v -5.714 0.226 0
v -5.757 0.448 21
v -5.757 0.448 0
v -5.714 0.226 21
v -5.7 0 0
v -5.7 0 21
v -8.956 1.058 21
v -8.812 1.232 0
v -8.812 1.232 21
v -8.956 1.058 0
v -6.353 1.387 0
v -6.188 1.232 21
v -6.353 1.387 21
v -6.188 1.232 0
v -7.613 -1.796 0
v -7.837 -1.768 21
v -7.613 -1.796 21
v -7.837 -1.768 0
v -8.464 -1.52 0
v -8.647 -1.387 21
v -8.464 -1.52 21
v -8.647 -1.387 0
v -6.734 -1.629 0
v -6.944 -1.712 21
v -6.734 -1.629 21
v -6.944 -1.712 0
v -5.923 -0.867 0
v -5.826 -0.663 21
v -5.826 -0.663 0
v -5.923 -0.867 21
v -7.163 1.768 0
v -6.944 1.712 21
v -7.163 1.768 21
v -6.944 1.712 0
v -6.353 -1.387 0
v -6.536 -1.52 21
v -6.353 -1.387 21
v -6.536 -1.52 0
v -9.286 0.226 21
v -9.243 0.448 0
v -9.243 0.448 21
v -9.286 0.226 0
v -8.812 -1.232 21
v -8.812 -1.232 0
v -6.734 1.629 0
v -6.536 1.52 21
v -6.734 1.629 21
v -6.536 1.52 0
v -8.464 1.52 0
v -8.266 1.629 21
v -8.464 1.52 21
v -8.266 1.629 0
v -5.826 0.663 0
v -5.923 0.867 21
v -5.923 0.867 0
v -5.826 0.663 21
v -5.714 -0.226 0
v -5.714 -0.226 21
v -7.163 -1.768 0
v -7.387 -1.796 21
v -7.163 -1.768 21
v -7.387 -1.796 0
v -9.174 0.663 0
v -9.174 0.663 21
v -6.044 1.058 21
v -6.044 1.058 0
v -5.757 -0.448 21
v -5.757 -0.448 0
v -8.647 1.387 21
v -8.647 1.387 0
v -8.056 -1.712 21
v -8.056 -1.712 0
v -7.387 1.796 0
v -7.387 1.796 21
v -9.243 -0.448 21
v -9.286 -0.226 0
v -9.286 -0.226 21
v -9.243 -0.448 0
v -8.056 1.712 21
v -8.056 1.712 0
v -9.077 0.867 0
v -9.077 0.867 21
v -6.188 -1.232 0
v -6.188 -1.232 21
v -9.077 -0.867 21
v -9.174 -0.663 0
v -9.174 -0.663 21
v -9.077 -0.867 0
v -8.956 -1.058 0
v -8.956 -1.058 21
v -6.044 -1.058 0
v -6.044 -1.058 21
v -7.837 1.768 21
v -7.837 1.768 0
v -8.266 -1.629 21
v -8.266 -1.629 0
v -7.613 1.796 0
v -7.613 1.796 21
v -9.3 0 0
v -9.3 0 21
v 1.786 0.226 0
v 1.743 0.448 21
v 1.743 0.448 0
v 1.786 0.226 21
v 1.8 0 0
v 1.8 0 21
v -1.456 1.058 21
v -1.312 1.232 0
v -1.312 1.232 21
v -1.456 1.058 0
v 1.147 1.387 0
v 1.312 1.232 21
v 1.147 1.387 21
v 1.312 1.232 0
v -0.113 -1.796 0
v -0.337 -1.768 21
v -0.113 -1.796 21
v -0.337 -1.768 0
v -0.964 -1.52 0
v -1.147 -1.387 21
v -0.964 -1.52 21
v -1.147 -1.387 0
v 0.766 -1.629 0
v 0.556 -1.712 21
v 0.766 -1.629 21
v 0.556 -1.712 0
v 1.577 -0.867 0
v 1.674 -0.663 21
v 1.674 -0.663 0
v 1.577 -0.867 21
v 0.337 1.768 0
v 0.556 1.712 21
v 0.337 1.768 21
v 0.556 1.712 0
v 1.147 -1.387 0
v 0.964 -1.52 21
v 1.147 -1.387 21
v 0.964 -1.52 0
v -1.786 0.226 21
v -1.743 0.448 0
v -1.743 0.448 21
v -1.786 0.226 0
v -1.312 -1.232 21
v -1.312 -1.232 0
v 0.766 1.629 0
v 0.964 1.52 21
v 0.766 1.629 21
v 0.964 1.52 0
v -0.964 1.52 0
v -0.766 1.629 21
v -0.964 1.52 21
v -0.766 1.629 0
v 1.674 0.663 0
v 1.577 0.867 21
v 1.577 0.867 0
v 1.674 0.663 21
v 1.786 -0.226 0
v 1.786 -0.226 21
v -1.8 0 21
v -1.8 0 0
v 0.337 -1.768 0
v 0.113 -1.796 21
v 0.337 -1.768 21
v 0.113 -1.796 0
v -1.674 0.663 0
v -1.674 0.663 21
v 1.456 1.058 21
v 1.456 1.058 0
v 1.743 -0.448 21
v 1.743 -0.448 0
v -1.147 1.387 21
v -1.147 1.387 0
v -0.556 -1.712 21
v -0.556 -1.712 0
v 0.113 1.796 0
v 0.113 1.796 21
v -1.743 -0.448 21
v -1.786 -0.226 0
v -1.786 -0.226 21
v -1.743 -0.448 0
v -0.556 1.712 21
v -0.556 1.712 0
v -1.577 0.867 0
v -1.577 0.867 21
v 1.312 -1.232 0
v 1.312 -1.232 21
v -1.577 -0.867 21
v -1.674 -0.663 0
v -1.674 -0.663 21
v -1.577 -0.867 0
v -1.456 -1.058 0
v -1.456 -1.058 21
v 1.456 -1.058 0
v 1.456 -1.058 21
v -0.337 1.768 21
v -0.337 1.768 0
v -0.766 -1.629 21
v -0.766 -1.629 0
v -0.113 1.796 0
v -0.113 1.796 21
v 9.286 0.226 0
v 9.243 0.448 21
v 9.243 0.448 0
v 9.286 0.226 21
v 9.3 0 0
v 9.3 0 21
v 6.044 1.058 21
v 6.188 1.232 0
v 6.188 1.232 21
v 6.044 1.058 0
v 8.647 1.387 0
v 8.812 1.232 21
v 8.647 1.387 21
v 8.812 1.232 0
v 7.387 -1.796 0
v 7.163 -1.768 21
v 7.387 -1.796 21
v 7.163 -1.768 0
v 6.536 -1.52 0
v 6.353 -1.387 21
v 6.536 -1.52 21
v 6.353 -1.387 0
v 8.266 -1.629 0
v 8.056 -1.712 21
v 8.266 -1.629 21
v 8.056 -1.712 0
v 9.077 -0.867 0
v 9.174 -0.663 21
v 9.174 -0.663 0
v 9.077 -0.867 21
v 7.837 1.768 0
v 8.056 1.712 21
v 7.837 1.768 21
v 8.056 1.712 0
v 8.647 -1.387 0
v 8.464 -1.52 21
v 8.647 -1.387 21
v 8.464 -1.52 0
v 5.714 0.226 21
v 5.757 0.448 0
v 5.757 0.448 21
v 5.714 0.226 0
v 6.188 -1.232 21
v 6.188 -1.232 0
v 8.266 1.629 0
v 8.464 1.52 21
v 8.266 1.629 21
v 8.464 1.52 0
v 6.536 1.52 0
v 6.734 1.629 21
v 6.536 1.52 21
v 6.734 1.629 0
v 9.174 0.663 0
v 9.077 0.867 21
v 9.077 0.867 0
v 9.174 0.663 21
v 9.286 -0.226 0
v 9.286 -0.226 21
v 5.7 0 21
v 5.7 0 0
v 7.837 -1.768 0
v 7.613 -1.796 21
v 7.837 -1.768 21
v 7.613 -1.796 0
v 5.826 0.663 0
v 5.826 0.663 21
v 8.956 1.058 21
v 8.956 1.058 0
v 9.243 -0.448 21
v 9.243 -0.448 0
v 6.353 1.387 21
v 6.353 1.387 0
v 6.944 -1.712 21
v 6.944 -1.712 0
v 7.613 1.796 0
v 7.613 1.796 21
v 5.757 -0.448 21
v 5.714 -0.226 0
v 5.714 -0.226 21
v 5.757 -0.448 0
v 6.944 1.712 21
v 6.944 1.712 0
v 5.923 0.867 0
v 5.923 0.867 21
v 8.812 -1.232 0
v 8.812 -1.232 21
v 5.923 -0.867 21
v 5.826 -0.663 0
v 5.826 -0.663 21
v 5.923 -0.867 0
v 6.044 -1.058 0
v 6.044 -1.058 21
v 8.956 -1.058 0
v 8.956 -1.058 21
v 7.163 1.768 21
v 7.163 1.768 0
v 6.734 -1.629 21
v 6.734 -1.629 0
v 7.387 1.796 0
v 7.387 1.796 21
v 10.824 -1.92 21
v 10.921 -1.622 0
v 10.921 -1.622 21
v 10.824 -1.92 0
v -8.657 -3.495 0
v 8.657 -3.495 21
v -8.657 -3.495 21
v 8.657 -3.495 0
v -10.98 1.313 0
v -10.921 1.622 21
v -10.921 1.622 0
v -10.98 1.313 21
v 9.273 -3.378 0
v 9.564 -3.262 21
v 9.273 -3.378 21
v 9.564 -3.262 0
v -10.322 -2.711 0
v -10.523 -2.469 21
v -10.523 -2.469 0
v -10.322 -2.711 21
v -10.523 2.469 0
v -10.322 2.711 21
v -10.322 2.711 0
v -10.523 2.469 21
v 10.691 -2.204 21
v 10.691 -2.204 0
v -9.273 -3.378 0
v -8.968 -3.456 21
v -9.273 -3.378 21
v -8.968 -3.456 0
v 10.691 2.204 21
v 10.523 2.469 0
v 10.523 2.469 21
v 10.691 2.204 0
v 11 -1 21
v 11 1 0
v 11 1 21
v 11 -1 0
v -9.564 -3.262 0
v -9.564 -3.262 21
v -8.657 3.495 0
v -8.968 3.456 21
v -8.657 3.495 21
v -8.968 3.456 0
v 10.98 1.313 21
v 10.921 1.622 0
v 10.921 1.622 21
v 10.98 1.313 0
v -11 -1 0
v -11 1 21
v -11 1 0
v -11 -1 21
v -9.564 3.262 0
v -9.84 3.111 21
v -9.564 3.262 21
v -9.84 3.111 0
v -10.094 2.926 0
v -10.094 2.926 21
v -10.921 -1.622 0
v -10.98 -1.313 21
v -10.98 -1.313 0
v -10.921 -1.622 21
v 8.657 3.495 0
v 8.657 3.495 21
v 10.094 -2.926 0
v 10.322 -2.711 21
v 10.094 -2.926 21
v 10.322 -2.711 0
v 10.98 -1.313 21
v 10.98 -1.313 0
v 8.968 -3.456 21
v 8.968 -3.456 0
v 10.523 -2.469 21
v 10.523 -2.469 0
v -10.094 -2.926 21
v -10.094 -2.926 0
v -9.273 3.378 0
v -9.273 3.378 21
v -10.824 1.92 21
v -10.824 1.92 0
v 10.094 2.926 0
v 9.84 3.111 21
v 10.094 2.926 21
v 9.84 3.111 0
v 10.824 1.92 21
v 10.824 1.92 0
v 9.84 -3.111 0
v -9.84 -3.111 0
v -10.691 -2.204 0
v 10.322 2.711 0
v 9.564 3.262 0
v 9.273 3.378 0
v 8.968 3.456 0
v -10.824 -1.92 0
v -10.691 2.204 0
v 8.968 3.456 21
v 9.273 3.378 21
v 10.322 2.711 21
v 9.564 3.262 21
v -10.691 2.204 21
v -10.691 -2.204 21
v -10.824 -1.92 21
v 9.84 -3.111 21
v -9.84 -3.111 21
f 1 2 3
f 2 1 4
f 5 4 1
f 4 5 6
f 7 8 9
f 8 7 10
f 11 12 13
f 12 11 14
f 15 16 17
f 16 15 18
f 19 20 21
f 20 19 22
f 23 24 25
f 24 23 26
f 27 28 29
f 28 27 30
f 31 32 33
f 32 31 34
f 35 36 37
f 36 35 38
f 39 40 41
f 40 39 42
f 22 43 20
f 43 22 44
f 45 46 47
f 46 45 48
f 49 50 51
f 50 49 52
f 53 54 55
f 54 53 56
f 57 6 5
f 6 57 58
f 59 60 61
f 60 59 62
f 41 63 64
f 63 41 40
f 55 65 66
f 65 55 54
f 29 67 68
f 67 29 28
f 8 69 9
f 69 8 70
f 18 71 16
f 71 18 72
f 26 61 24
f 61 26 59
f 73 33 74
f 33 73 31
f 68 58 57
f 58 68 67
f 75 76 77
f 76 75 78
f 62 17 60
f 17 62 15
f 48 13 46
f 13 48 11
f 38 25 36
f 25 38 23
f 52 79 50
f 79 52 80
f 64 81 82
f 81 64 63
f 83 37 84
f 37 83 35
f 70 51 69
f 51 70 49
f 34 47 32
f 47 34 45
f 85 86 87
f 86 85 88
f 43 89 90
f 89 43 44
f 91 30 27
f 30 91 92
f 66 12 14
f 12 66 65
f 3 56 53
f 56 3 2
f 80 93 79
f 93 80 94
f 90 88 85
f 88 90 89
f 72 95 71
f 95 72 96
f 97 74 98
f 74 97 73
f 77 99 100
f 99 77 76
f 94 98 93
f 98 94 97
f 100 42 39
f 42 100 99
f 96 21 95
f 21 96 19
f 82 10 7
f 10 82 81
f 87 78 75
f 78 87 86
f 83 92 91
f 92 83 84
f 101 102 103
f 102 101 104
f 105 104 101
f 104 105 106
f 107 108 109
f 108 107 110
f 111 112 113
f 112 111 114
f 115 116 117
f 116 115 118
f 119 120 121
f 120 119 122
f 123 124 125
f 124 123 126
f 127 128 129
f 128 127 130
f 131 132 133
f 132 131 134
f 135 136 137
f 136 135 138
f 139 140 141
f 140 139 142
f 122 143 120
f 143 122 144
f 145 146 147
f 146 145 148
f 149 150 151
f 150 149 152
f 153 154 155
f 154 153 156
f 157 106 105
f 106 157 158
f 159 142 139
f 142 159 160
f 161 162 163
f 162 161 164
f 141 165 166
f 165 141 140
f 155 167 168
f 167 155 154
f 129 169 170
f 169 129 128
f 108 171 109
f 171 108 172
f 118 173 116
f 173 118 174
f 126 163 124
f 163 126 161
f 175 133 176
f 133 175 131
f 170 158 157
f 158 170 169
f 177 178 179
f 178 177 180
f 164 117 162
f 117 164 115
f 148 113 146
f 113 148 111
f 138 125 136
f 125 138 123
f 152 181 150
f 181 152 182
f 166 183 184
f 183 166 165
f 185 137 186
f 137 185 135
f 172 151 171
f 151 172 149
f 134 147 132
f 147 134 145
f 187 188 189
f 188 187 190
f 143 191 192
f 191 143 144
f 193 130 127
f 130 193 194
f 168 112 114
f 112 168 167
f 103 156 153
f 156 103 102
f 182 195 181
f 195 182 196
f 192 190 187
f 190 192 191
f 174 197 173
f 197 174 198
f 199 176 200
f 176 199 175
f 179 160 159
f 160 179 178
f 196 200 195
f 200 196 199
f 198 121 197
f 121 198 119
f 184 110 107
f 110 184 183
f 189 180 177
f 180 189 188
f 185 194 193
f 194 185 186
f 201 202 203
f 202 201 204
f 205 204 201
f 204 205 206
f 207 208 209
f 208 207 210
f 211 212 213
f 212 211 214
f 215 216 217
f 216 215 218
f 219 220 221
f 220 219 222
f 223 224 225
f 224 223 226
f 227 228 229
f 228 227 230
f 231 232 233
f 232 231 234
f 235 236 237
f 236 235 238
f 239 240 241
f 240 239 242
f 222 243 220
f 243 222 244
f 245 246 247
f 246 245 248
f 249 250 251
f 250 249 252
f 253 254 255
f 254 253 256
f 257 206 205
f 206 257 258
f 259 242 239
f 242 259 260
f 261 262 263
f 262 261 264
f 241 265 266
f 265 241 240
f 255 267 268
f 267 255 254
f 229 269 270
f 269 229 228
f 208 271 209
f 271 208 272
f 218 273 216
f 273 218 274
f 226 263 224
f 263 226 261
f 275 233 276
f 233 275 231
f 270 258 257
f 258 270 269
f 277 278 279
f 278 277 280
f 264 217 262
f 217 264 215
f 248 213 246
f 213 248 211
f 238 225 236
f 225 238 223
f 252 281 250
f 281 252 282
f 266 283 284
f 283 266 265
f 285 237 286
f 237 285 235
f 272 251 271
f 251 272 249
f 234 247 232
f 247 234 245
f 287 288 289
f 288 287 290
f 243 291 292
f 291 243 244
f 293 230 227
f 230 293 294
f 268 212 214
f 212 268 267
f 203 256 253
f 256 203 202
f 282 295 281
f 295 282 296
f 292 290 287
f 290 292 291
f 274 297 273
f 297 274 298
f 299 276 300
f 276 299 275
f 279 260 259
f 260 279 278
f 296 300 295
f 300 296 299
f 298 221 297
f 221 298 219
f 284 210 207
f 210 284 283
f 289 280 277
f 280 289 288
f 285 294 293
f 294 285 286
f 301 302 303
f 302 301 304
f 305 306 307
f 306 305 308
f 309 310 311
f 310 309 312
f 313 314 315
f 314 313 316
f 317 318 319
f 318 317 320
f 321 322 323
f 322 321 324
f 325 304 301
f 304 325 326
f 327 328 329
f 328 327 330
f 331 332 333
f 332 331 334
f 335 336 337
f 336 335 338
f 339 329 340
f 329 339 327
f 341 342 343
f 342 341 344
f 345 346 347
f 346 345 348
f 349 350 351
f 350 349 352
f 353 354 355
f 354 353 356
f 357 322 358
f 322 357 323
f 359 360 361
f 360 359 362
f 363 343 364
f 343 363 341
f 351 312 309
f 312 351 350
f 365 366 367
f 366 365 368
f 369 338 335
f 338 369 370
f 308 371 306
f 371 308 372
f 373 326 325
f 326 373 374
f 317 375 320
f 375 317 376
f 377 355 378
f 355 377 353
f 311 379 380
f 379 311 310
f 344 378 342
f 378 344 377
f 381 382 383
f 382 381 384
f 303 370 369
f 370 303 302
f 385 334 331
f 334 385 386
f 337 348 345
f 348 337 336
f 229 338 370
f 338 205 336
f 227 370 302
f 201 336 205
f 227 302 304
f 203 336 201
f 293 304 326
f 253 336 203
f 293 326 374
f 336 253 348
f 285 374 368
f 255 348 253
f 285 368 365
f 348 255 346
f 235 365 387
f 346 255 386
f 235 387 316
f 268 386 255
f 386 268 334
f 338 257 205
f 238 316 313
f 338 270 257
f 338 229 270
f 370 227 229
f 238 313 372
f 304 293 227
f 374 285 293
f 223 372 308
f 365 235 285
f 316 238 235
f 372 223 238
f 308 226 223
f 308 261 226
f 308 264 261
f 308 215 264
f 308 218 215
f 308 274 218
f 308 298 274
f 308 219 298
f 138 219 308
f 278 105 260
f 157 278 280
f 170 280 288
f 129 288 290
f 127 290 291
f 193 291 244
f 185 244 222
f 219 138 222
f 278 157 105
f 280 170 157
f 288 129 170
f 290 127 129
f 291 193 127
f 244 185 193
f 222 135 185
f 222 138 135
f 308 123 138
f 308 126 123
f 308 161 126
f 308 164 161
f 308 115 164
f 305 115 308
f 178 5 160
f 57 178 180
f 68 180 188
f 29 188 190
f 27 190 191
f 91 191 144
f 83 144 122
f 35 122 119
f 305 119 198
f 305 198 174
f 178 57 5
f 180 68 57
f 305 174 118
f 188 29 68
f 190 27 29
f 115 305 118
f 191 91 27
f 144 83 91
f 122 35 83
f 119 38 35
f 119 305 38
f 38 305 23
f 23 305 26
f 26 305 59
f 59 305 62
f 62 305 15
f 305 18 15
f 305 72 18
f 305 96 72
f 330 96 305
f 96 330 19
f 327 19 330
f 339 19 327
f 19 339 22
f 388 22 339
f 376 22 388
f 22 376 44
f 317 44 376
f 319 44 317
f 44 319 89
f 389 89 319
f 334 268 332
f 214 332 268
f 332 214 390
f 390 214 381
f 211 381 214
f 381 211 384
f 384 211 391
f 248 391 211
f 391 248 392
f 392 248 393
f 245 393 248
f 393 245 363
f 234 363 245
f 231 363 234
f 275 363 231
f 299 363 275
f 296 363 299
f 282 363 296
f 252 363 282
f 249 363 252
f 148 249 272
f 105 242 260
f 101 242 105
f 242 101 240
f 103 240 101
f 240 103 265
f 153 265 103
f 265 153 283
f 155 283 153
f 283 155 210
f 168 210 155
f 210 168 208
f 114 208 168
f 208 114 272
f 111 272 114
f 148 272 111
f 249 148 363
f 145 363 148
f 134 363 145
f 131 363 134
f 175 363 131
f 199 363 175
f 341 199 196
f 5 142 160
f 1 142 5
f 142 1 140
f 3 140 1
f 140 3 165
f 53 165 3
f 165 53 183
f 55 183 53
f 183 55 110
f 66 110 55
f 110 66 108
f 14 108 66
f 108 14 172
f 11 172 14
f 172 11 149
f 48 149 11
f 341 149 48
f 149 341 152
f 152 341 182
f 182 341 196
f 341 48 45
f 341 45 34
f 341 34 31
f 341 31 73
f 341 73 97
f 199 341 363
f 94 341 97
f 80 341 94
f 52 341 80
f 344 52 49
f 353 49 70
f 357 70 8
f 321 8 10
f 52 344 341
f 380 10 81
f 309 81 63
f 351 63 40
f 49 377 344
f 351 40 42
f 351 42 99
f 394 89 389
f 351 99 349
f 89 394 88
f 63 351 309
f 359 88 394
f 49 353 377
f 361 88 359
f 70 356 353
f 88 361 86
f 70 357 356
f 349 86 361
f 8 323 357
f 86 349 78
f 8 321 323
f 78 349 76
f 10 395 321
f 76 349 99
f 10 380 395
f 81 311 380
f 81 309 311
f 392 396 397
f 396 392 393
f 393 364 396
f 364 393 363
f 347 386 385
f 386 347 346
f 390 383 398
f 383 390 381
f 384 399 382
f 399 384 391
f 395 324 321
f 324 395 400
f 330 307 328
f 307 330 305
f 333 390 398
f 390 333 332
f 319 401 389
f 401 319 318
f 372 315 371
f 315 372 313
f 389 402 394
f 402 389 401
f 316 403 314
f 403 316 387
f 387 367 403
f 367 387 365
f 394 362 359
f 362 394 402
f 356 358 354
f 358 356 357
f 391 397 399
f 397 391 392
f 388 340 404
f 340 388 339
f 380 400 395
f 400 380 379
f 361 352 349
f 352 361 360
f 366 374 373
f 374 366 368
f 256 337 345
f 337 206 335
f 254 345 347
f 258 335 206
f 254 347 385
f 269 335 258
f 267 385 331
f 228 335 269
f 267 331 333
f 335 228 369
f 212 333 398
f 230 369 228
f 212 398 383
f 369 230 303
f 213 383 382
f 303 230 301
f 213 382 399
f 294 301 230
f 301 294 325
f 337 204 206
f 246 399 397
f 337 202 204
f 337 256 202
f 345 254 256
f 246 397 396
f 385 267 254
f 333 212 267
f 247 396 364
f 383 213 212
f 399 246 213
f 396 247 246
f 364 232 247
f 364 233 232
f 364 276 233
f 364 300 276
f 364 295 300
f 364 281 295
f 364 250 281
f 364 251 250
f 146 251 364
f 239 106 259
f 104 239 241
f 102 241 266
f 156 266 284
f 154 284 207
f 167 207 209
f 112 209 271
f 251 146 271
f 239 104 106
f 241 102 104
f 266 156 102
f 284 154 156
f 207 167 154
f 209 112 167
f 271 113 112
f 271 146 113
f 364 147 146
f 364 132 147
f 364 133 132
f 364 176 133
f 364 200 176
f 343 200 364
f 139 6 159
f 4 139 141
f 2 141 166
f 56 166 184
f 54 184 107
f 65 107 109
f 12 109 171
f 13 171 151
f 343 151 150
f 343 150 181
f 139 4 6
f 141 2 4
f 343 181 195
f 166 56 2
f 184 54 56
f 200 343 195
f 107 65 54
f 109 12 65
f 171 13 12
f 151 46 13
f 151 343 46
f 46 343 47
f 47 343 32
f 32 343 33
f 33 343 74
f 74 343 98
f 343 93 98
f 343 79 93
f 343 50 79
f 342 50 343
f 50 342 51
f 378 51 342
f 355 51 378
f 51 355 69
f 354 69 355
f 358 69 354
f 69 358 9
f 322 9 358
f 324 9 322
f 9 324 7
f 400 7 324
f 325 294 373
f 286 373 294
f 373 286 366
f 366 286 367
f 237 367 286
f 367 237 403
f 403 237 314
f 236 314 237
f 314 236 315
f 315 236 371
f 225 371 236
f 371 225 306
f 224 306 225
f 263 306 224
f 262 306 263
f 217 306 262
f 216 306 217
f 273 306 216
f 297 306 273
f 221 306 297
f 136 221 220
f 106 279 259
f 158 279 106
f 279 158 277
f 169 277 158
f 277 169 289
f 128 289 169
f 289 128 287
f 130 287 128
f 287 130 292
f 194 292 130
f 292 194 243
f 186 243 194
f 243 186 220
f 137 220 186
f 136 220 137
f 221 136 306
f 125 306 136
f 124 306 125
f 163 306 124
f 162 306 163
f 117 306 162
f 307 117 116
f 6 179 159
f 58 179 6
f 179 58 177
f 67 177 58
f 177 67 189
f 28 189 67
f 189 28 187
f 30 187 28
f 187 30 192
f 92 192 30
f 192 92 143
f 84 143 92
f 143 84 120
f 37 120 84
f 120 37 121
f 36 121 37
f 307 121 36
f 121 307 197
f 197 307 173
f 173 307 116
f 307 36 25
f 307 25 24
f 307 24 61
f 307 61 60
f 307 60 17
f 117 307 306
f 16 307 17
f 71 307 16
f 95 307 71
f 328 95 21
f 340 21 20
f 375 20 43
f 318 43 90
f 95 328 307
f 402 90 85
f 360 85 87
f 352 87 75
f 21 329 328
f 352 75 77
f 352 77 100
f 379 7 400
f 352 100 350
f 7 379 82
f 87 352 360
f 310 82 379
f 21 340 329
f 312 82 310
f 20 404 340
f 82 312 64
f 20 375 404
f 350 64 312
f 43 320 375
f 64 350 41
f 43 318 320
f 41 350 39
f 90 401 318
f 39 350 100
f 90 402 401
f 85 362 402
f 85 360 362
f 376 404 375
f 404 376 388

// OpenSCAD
$fn = 50;


difference() {
	union() {
		translate(v = [0, 0, 0]) {
			rotate(a = [0, 0, 0]) {
				hull() {
					translate(v = [-8.5000000000, 1.0000000000, 0]) {
						rotate(a = [0, 0, 0]) {
							translate(v = [0, 0, 0]) {
								rotate(a = [0, 0, 0]) {
									cylinder(h = 21, r = 2.5000000000);
								}
							}
						}
					}
					translate(v = [8.5000000000, 1.0000000000, 0]) {
						rotate(a = [0, 0, 0]) {
							translate(v = [0, 0, 0]) {
								rotate(a = [0, 0, 0]) {
									cylinder(h = 21, r = 2.5000000000);
								}
							}
						}
					}
					translate(v = [-8.5000000000, -1.0000000000, 0]) {
						rotate(a = [0, 0, 0]) {
							translate(v = [0, 0, 0]) {
								rotate(a = [0, 0, 0]) {
									cylinder(h = 21, r = 2.5000000000);
								}
							}
						}
					}
					translate(v = [8.5000000000, -1.0000000000, 0]) {
						rotate(a = [0, 0, 0]) {
							translate(v = [0, 0, 0]) {
								rotate(a = [0, 0, 0]) {
									cylinder(h = 21, r = 2.5000000000);
								}
							}
						}
					}
				}
			}
		}
	}
	union() {
		translate(v = [-7.5000000000, 0.0000000000, 0]) {
			rotate(a = [0, 0, 0]) {
				translate(v = [0, 0, -50]) {
					rotate(a = [0, 0, 0]) {
						cylinder(h = 100, r = 1.8000000000);
					}
				}
			}
		}
		translate(v = [0.0000000000, 0.0000000000, 0]) {
			rotate(a = [0, 0, 0]) {
				translate(v = [0, 0, -50]) {
					rotate(a = [0, 0, 0]) {
						cylinder(h = 100, r = 1.8000000000);
					}
				}
			}
		}
		translate(v = [7.5000000000, 0.0000000000, 0]) {
			rotate(a = [0, 0, 0]) {
				translate(v = [0, 0, -50]) {
					rotate(a = [0, 0, 0]) {
						cylinder(h = 100, r = 1.8000000000);
					}
				}
			}
		}
	}
}
